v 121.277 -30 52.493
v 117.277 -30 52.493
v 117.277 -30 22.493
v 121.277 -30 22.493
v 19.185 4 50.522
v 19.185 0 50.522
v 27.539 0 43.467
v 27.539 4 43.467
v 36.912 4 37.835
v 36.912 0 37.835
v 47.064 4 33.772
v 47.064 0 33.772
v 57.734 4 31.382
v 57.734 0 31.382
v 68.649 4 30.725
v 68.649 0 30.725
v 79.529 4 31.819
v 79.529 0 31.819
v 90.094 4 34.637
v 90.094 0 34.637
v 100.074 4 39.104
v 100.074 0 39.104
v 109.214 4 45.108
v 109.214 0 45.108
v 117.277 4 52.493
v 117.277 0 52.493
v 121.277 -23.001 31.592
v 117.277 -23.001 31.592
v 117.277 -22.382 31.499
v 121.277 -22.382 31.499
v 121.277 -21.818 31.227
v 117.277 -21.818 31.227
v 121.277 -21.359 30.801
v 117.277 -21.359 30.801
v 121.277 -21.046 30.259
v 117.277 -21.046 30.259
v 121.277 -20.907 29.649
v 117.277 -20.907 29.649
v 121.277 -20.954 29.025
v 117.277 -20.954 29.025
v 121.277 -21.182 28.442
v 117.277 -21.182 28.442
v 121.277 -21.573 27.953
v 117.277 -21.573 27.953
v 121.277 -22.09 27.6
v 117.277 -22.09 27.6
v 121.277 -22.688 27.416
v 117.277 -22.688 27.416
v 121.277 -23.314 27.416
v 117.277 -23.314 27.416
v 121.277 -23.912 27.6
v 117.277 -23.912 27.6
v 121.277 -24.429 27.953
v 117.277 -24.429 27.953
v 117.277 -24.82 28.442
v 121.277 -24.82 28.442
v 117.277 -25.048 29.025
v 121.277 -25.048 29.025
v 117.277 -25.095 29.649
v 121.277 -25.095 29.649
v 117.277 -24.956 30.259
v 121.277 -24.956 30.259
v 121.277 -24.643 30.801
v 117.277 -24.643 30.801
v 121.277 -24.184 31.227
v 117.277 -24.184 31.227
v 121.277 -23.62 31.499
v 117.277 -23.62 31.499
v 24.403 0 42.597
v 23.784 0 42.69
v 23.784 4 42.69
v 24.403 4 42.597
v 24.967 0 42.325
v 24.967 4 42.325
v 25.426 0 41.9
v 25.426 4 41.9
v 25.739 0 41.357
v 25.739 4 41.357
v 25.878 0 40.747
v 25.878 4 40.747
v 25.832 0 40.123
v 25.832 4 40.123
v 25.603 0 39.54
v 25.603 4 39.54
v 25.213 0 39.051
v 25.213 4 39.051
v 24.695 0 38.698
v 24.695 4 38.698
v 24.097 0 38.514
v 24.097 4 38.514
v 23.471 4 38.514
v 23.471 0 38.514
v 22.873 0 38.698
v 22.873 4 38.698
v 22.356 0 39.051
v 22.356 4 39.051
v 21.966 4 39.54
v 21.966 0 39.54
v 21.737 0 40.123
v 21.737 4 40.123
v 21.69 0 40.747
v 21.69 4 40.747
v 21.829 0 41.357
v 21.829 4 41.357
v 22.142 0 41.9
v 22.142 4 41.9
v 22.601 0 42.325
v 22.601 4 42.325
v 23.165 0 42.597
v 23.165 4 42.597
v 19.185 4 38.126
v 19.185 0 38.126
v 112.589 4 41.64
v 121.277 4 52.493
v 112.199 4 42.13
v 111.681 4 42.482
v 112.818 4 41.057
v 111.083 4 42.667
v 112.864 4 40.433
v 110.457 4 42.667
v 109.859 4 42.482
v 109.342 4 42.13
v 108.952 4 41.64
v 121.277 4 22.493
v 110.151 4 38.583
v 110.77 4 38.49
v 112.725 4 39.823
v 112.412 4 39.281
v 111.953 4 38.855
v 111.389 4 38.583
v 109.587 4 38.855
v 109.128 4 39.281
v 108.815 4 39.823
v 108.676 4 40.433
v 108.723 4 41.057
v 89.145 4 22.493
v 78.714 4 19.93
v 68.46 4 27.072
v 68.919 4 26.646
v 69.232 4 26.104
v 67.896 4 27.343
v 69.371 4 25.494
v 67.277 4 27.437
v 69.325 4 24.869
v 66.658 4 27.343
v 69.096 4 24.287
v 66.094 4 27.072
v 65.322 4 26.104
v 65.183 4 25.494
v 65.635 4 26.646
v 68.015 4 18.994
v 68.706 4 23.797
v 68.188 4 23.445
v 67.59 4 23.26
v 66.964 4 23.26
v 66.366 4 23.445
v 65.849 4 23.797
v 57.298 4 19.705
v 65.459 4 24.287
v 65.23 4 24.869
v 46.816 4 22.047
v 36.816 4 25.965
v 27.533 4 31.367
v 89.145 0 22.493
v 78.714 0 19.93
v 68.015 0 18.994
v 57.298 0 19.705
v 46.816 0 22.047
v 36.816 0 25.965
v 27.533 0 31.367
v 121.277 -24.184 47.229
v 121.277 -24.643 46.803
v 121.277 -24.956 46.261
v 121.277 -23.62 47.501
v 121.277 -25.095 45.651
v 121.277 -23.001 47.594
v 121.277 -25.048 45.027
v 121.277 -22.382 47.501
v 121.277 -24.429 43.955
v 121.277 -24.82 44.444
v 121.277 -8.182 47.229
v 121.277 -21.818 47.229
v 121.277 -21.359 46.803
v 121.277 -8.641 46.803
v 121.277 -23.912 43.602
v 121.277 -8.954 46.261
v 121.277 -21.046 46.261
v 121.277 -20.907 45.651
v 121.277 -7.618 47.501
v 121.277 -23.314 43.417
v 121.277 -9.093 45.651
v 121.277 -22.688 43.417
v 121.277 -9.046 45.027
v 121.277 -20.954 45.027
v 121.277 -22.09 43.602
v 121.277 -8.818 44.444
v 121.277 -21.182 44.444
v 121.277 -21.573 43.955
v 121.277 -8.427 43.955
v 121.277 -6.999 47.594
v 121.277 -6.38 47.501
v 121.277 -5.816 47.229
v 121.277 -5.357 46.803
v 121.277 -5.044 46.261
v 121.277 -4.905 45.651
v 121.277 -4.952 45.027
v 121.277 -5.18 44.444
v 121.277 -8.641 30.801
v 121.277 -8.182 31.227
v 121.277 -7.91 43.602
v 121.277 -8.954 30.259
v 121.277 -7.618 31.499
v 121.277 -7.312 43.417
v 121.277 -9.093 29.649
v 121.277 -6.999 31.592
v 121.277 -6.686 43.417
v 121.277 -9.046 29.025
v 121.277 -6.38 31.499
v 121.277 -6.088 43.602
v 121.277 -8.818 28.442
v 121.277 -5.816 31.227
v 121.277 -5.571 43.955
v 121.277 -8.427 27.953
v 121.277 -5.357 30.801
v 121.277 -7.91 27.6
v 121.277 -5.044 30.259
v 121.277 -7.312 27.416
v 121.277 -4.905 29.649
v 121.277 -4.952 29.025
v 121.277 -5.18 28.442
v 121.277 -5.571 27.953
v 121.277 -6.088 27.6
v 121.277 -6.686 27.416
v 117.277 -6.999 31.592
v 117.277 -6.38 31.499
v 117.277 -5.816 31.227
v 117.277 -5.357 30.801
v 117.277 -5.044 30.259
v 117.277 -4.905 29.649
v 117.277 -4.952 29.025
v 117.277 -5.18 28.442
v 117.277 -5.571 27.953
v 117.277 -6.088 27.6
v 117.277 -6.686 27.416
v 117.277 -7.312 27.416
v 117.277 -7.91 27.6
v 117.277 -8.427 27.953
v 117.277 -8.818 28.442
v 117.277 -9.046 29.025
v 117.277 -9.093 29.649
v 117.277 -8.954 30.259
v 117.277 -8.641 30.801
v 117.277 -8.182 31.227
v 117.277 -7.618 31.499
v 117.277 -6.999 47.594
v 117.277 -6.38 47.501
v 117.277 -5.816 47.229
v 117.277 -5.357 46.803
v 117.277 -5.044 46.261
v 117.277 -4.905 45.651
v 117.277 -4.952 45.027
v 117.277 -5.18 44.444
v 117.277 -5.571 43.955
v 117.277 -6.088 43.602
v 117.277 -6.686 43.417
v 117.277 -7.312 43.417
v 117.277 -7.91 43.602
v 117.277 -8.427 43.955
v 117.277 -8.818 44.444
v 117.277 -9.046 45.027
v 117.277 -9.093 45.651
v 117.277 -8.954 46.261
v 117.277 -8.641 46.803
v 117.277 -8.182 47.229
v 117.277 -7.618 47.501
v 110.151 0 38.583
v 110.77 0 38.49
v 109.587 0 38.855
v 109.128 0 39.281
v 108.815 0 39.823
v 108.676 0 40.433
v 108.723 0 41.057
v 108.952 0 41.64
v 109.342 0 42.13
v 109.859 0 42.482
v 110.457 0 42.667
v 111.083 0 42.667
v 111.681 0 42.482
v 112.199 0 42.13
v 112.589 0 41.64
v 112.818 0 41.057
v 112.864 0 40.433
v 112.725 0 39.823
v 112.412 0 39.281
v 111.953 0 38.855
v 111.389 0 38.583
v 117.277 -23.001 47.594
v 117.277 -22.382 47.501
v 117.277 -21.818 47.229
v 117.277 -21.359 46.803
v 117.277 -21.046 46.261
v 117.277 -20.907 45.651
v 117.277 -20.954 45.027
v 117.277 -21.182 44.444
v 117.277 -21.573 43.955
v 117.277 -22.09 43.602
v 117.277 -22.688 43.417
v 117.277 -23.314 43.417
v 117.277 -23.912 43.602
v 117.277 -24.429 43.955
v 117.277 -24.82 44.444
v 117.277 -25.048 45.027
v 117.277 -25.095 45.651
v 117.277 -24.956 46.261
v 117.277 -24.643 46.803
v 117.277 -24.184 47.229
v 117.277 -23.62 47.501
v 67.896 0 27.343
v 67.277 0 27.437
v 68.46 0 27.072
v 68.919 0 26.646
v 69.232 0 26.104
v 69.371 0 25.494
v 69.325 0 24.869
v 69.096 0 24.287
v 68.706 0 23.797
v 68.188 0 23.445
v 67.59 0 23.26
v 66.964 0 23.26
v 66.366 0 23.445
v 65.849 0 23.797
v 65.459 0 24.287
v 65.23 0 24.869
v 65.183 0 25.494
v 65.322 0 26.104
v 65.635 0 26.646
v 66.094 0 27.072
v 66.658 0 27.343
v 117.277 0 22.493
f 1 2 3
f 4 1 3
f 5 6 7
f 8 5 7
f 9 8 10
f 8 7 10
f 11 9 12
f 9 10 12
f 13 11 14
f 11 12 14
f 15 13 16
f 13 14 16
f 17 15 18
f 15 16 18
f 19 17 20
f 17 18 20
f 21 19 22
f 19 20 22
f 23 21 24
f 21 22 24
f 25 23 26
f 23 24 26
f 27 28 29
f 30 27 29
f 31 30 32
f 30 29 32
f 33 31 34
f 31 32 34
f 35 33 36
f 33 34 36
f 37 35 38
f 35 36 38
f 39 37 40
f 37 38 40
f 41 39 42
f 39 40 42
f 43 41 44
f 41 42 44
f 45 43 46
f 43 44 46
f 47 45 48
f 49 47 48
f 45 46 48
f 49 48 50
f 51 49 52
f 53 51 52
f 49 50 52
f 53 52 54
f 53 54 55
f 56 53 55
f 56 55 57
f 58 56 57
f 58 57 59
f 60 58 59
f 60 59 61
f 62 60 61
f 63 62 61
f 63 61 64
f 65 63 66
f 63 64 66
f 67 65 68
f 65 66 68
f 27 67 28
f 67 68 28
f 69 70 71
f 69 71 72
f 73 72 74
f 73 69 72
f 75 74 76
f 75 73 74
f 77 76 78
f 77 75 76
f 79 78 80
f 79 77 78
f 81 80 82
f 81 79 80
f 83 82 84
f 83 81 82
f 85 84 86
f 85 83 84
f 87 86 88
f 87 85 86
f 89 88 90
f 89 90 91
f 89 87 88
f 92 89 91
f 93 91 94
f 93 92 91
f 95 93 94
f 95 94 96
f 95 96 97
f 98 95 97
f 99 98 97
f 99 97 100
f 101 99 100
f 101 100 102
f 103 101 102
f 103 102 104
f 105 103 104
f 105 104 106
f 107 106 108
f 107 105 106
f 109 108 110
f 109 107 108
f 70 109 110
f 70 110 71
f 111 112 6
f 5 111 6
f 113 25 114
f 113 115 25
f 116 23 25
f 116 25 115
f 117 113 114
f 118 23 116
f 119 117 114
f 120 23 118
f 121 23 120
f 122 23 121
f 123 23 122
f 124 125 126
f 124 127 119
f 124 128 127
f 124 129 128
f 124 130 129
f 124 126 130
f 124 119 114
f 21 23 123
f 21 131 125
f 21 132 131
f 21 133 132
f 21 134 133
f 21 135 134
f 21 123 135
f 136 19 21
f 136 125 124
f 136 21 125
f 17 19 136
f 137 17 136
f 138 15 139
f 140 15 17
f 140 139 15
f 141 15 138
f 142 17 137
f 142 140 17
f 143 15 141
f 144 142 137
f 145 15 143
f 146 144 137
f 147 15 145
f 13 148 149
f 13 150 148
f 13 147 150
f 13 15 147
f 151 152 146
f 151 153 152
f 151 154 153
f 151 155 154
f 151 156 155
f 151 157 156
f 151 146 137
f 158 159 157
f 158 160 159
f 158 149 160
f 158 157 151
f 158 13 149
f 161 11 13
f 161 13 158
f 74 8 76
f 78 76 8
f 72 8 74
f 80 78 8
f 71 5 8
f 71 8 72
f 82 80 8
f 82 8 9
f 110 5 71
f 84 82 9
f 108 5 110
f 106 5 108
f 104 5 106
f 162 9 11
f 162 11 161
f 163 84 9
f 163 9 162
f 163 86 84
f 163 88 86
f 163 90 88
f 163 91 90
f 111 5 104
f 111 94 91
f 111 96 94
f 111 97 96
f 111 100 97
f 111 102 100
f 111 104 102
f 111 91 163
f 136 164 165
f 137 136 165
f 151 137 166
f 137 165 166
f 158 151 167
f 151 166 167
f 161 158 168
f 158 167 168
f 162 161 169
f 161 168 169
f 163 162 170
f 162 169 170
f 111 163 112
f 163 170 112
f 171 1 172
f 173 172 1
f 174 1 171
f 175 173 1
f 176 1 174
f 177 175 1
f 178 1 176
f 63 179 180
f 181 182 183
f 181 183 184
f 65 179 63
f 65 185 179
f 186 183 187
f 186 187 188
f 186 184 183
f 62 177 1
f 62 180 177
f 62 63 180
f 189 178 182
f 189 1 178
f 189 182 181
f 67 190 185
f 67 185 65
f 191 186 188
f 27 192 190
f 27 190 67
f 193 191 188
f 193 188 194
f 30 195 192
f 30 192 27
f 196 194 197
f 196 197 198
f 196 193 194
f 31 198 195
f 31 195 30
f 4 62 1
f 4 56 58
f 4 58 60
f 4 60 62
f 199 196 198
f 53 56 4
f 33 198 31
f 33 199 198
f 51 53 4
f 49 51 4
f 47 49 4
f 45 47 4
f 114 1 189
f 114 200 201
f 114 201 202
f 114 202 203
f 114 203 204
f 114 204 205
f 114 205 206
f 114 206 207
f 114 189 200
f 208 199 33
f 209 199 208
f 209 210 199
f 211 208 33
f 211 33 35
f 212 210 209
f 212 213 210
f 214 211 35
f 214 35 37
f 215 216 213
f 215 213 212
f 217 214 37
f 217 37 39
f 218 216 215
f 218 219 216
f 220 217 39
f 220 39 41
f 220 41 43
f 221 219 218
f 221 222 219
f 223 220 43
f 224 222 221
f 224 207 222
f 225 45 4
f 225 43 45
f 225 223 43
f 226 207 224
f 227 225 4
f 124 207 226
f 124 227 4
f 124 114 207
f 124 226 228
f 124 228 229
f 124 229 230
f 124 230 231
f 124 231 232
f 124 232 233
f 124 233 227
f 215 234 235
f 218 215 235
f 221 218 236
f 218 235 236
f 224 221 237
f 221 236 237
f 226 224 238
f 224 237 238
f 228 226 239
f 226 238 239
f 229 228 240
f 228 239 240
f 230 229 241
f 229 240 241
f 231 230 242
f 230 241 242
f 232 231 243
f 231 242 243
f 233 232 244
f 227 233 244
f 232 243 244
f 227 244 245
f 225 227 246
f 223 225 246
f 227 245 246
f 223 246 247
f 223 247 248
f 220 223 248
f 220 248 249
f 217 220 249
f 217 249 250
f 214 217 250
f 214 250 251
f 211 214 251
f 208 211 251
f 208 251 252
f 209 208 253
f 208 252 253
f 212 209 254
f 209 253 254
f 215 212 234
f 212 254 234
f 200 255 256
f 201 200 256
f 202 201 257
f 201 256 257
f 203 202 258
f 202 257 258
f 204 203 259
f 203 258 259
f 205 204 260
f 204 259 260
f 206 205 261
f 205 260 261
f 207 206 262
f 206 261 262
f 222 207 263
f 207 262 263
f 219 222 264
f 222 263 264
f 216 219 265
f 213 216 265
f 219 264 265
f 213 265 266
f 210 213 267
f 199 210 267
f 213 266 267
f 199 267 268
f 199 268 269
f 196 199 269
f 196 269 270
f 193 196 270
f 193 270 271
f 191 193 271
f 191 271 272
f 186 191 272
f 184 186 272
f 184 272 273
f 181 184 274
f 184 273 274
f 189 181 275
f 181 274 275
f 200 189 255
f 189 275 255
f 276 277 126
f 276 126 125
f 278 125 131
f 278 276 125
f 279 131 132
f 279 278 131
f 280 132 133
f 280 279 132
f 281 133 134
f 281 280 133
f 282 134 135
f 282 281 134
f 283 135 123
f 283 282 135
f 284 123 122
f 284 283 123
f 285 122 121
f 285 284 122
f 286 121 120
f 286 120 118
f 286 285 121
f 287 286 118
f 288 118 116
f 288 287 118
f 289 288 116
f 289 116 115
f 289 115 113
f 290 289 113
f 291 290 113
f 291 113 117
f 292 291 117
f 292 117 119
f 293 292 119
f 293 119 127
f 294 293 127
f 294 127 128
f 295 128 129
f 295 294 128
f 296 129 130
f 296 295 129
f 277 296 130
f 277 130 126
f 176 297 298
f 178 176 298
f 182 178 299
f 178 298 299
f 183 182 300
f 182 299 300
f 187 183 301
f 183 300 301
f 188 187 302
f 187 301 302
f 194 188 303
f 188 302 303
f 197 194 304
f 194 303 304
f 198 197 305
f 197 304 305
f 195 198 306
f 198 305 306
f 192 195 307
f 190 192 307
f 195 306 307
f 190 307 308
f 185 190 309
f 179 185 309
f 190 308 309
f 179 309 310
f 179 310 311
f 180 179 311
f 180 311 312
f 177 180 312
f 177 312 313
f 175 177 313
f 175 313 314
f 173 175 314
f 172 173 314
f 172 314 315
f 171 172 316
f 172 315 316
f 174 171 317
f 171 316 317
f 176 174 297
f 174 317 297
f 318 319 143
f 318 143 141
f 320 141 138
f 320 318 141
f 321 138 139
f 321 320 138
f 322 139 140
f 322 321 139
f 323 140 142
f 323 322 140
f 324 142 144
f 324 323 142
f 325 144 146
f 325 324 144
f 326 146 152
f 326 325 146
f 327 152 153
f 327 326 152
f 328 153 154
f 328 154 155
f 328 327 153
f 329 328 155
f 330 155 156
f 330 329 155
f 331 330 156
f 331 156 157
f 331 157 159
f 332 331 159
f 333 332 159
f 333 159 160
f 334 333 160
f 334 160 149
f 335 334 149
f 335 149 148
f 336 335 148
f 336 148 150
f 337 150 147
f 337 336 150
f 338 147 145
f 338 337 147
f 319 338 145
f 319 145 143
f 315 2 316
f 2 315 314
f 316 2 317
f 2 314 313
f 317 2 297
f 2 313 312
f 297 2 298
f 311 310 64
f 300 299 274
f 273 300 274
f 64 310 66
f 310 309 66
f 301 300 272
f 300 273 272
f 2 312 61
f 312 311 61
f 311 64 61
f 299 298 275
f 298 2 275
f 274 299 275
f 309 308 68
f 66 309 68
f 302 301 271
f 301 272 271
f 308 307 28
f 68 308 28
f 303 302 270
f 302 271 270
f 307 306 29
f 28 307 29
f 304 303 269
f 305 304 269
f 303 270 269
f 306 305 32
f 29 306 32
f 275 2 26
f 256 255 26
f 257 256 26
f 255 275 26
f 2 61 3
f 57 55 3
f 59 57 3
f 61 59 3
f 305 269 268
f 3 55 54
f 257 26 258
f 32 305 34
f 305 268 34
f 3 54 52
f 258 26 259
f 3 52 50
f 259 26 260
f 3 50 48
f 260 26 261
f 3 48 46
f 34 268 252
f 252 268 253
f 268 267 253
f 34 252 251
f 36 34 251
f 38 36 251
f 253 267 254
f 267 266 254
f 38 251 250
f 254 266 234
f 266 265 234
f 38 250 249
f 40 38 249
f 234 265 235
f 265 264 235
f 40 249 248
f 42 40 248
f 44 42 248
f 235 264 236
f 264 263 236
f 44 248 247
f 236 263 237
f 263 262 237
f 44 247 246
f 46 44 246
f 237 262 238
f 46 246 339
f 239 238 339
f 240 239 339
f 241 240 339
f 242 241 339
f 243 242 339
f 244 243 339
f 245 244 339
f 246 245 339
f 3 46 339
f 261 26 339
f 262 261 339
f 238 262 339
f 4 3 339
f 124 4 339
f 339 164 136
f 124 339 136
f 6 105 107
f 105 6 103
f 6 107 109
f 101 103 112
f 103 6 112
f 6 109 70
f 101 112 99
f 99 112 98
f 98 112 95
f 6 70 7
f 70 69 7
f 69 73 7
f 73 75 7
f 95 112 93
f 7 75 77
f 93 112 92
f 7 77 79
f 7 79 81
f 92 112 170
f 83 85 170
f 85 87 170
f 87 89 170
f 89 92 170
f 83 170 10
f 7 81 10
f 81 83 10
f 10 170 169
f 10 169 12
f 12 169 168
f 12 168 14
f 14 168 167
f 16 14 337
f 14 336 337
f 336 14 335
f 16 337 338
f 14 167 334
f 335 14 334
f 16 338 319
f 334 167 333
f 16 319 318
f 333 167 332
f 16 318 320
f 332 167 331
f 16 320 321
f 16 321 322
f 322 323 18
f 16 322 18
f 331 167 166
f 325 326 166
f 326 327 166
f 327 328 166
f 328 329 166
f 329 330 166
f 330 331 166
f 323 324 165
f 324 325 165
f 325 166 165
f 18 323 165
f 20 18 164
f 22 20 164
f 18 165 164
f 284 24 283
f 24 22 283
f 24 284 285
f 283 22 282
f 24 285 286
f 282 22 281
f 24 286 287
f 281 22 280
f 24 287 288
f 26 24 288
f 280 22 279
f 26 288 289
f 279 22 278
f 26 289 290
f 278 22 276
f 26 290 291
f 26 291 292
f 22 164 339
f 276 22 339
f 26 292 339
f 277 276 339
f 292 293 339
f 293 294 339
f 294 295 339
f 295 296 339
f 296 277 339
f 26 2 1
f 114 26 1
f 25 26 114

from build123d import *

# Parameters (mm, degrees)
SKETCH1_R           = 2.1
BOSS_EXTRUDE1_DEPTH = 4
SKETCH3_W           = 30
SKETCH3_H           = 34
BOSS_EXTRUDE4_DEPTH = 4
SKETCH4_R           = 2.1
CUT_EXTRUDE1_DEPTH  = 4


with BuildPart() as part:
    # Sketch1 → Boss-Extrude1 (new body)
    with BuildSketch(Plane(origin=(0, 0, 0), x_dir=(1, 0, 0), z_dir=(0, 1, 0))):
        with BuildLine():
            Line((19.185222031, -38.125659411), (19.185222031, -50.522227261))
            ThreePointArc((19.185222031, -50.522227261), (68.648777269, -30.725135996), (117.277214352, -52.493076326))
            Line((117.277214352, -52.493076326), (117.277214352, -22.493076326))
            Line((117.277214352, -22.493076326), (89.144688482, -22.493076326))
            ThreePointArc((89.144688482, -22.493076326), (52.012033316, -20.674538522), (19.185222031, -38.125659411))
        make_face()
        with Locations(Location((67.277214352, -25.33669757, 0), (0, 0, 270))):
            Circle(SKETCH1_R, mode=Mode.SUBTRACT)
        with Locations(Location((23.784262782, -40.590182935, 0), (0, 0, 270))):
            Circle(SKETCH1_R, mode=Mode.SUBTRACT)
        with Locations(Location((110.770165922, -40.590182935, 0), (0, 0, 90))):
            Circle(SKETCH1_R, mode=Mode.SUBTRACT)
    extrude(amount=BOSS_EXTRUDE1_DEPTH)

    # Sketch3 → Boss-Extrude4 (add)
    with BuildSketch(Plane(origin=(117.277214352, 0, 0), x_dir=(0, 0, -1), z_dir=(1, 0, 0))):
        with Locations((-37.493076326, -13)):
            Rectangle(SKETCH3_W, SKETCH3_H)
    extrude(amount=BOSS_EXTRUDE4_DEPTH)

    # Sketch4 → Cut-Extrude1 (cut)
    with BuildSketch(Plane.ZY.offset(-117.277214352)):
        with Locations((29.492163097, -6.999086771)):
            Circle(SKETCH4_R)
        with Locations((45.493989555, -6.999086771)):
            Circle(SKETCH4_R)
        with Locations((45.493989555, -23.000913229)):
            Circle(SKETCH4_R)
        with Locations((29.492163097, -23.000913229)):
            Circle(SKETCH4_R)
    extrude(amount=-CUT_EXTRUDE1_DEPTH, mode=Mode.SUBTRACT)


solid = part.part
